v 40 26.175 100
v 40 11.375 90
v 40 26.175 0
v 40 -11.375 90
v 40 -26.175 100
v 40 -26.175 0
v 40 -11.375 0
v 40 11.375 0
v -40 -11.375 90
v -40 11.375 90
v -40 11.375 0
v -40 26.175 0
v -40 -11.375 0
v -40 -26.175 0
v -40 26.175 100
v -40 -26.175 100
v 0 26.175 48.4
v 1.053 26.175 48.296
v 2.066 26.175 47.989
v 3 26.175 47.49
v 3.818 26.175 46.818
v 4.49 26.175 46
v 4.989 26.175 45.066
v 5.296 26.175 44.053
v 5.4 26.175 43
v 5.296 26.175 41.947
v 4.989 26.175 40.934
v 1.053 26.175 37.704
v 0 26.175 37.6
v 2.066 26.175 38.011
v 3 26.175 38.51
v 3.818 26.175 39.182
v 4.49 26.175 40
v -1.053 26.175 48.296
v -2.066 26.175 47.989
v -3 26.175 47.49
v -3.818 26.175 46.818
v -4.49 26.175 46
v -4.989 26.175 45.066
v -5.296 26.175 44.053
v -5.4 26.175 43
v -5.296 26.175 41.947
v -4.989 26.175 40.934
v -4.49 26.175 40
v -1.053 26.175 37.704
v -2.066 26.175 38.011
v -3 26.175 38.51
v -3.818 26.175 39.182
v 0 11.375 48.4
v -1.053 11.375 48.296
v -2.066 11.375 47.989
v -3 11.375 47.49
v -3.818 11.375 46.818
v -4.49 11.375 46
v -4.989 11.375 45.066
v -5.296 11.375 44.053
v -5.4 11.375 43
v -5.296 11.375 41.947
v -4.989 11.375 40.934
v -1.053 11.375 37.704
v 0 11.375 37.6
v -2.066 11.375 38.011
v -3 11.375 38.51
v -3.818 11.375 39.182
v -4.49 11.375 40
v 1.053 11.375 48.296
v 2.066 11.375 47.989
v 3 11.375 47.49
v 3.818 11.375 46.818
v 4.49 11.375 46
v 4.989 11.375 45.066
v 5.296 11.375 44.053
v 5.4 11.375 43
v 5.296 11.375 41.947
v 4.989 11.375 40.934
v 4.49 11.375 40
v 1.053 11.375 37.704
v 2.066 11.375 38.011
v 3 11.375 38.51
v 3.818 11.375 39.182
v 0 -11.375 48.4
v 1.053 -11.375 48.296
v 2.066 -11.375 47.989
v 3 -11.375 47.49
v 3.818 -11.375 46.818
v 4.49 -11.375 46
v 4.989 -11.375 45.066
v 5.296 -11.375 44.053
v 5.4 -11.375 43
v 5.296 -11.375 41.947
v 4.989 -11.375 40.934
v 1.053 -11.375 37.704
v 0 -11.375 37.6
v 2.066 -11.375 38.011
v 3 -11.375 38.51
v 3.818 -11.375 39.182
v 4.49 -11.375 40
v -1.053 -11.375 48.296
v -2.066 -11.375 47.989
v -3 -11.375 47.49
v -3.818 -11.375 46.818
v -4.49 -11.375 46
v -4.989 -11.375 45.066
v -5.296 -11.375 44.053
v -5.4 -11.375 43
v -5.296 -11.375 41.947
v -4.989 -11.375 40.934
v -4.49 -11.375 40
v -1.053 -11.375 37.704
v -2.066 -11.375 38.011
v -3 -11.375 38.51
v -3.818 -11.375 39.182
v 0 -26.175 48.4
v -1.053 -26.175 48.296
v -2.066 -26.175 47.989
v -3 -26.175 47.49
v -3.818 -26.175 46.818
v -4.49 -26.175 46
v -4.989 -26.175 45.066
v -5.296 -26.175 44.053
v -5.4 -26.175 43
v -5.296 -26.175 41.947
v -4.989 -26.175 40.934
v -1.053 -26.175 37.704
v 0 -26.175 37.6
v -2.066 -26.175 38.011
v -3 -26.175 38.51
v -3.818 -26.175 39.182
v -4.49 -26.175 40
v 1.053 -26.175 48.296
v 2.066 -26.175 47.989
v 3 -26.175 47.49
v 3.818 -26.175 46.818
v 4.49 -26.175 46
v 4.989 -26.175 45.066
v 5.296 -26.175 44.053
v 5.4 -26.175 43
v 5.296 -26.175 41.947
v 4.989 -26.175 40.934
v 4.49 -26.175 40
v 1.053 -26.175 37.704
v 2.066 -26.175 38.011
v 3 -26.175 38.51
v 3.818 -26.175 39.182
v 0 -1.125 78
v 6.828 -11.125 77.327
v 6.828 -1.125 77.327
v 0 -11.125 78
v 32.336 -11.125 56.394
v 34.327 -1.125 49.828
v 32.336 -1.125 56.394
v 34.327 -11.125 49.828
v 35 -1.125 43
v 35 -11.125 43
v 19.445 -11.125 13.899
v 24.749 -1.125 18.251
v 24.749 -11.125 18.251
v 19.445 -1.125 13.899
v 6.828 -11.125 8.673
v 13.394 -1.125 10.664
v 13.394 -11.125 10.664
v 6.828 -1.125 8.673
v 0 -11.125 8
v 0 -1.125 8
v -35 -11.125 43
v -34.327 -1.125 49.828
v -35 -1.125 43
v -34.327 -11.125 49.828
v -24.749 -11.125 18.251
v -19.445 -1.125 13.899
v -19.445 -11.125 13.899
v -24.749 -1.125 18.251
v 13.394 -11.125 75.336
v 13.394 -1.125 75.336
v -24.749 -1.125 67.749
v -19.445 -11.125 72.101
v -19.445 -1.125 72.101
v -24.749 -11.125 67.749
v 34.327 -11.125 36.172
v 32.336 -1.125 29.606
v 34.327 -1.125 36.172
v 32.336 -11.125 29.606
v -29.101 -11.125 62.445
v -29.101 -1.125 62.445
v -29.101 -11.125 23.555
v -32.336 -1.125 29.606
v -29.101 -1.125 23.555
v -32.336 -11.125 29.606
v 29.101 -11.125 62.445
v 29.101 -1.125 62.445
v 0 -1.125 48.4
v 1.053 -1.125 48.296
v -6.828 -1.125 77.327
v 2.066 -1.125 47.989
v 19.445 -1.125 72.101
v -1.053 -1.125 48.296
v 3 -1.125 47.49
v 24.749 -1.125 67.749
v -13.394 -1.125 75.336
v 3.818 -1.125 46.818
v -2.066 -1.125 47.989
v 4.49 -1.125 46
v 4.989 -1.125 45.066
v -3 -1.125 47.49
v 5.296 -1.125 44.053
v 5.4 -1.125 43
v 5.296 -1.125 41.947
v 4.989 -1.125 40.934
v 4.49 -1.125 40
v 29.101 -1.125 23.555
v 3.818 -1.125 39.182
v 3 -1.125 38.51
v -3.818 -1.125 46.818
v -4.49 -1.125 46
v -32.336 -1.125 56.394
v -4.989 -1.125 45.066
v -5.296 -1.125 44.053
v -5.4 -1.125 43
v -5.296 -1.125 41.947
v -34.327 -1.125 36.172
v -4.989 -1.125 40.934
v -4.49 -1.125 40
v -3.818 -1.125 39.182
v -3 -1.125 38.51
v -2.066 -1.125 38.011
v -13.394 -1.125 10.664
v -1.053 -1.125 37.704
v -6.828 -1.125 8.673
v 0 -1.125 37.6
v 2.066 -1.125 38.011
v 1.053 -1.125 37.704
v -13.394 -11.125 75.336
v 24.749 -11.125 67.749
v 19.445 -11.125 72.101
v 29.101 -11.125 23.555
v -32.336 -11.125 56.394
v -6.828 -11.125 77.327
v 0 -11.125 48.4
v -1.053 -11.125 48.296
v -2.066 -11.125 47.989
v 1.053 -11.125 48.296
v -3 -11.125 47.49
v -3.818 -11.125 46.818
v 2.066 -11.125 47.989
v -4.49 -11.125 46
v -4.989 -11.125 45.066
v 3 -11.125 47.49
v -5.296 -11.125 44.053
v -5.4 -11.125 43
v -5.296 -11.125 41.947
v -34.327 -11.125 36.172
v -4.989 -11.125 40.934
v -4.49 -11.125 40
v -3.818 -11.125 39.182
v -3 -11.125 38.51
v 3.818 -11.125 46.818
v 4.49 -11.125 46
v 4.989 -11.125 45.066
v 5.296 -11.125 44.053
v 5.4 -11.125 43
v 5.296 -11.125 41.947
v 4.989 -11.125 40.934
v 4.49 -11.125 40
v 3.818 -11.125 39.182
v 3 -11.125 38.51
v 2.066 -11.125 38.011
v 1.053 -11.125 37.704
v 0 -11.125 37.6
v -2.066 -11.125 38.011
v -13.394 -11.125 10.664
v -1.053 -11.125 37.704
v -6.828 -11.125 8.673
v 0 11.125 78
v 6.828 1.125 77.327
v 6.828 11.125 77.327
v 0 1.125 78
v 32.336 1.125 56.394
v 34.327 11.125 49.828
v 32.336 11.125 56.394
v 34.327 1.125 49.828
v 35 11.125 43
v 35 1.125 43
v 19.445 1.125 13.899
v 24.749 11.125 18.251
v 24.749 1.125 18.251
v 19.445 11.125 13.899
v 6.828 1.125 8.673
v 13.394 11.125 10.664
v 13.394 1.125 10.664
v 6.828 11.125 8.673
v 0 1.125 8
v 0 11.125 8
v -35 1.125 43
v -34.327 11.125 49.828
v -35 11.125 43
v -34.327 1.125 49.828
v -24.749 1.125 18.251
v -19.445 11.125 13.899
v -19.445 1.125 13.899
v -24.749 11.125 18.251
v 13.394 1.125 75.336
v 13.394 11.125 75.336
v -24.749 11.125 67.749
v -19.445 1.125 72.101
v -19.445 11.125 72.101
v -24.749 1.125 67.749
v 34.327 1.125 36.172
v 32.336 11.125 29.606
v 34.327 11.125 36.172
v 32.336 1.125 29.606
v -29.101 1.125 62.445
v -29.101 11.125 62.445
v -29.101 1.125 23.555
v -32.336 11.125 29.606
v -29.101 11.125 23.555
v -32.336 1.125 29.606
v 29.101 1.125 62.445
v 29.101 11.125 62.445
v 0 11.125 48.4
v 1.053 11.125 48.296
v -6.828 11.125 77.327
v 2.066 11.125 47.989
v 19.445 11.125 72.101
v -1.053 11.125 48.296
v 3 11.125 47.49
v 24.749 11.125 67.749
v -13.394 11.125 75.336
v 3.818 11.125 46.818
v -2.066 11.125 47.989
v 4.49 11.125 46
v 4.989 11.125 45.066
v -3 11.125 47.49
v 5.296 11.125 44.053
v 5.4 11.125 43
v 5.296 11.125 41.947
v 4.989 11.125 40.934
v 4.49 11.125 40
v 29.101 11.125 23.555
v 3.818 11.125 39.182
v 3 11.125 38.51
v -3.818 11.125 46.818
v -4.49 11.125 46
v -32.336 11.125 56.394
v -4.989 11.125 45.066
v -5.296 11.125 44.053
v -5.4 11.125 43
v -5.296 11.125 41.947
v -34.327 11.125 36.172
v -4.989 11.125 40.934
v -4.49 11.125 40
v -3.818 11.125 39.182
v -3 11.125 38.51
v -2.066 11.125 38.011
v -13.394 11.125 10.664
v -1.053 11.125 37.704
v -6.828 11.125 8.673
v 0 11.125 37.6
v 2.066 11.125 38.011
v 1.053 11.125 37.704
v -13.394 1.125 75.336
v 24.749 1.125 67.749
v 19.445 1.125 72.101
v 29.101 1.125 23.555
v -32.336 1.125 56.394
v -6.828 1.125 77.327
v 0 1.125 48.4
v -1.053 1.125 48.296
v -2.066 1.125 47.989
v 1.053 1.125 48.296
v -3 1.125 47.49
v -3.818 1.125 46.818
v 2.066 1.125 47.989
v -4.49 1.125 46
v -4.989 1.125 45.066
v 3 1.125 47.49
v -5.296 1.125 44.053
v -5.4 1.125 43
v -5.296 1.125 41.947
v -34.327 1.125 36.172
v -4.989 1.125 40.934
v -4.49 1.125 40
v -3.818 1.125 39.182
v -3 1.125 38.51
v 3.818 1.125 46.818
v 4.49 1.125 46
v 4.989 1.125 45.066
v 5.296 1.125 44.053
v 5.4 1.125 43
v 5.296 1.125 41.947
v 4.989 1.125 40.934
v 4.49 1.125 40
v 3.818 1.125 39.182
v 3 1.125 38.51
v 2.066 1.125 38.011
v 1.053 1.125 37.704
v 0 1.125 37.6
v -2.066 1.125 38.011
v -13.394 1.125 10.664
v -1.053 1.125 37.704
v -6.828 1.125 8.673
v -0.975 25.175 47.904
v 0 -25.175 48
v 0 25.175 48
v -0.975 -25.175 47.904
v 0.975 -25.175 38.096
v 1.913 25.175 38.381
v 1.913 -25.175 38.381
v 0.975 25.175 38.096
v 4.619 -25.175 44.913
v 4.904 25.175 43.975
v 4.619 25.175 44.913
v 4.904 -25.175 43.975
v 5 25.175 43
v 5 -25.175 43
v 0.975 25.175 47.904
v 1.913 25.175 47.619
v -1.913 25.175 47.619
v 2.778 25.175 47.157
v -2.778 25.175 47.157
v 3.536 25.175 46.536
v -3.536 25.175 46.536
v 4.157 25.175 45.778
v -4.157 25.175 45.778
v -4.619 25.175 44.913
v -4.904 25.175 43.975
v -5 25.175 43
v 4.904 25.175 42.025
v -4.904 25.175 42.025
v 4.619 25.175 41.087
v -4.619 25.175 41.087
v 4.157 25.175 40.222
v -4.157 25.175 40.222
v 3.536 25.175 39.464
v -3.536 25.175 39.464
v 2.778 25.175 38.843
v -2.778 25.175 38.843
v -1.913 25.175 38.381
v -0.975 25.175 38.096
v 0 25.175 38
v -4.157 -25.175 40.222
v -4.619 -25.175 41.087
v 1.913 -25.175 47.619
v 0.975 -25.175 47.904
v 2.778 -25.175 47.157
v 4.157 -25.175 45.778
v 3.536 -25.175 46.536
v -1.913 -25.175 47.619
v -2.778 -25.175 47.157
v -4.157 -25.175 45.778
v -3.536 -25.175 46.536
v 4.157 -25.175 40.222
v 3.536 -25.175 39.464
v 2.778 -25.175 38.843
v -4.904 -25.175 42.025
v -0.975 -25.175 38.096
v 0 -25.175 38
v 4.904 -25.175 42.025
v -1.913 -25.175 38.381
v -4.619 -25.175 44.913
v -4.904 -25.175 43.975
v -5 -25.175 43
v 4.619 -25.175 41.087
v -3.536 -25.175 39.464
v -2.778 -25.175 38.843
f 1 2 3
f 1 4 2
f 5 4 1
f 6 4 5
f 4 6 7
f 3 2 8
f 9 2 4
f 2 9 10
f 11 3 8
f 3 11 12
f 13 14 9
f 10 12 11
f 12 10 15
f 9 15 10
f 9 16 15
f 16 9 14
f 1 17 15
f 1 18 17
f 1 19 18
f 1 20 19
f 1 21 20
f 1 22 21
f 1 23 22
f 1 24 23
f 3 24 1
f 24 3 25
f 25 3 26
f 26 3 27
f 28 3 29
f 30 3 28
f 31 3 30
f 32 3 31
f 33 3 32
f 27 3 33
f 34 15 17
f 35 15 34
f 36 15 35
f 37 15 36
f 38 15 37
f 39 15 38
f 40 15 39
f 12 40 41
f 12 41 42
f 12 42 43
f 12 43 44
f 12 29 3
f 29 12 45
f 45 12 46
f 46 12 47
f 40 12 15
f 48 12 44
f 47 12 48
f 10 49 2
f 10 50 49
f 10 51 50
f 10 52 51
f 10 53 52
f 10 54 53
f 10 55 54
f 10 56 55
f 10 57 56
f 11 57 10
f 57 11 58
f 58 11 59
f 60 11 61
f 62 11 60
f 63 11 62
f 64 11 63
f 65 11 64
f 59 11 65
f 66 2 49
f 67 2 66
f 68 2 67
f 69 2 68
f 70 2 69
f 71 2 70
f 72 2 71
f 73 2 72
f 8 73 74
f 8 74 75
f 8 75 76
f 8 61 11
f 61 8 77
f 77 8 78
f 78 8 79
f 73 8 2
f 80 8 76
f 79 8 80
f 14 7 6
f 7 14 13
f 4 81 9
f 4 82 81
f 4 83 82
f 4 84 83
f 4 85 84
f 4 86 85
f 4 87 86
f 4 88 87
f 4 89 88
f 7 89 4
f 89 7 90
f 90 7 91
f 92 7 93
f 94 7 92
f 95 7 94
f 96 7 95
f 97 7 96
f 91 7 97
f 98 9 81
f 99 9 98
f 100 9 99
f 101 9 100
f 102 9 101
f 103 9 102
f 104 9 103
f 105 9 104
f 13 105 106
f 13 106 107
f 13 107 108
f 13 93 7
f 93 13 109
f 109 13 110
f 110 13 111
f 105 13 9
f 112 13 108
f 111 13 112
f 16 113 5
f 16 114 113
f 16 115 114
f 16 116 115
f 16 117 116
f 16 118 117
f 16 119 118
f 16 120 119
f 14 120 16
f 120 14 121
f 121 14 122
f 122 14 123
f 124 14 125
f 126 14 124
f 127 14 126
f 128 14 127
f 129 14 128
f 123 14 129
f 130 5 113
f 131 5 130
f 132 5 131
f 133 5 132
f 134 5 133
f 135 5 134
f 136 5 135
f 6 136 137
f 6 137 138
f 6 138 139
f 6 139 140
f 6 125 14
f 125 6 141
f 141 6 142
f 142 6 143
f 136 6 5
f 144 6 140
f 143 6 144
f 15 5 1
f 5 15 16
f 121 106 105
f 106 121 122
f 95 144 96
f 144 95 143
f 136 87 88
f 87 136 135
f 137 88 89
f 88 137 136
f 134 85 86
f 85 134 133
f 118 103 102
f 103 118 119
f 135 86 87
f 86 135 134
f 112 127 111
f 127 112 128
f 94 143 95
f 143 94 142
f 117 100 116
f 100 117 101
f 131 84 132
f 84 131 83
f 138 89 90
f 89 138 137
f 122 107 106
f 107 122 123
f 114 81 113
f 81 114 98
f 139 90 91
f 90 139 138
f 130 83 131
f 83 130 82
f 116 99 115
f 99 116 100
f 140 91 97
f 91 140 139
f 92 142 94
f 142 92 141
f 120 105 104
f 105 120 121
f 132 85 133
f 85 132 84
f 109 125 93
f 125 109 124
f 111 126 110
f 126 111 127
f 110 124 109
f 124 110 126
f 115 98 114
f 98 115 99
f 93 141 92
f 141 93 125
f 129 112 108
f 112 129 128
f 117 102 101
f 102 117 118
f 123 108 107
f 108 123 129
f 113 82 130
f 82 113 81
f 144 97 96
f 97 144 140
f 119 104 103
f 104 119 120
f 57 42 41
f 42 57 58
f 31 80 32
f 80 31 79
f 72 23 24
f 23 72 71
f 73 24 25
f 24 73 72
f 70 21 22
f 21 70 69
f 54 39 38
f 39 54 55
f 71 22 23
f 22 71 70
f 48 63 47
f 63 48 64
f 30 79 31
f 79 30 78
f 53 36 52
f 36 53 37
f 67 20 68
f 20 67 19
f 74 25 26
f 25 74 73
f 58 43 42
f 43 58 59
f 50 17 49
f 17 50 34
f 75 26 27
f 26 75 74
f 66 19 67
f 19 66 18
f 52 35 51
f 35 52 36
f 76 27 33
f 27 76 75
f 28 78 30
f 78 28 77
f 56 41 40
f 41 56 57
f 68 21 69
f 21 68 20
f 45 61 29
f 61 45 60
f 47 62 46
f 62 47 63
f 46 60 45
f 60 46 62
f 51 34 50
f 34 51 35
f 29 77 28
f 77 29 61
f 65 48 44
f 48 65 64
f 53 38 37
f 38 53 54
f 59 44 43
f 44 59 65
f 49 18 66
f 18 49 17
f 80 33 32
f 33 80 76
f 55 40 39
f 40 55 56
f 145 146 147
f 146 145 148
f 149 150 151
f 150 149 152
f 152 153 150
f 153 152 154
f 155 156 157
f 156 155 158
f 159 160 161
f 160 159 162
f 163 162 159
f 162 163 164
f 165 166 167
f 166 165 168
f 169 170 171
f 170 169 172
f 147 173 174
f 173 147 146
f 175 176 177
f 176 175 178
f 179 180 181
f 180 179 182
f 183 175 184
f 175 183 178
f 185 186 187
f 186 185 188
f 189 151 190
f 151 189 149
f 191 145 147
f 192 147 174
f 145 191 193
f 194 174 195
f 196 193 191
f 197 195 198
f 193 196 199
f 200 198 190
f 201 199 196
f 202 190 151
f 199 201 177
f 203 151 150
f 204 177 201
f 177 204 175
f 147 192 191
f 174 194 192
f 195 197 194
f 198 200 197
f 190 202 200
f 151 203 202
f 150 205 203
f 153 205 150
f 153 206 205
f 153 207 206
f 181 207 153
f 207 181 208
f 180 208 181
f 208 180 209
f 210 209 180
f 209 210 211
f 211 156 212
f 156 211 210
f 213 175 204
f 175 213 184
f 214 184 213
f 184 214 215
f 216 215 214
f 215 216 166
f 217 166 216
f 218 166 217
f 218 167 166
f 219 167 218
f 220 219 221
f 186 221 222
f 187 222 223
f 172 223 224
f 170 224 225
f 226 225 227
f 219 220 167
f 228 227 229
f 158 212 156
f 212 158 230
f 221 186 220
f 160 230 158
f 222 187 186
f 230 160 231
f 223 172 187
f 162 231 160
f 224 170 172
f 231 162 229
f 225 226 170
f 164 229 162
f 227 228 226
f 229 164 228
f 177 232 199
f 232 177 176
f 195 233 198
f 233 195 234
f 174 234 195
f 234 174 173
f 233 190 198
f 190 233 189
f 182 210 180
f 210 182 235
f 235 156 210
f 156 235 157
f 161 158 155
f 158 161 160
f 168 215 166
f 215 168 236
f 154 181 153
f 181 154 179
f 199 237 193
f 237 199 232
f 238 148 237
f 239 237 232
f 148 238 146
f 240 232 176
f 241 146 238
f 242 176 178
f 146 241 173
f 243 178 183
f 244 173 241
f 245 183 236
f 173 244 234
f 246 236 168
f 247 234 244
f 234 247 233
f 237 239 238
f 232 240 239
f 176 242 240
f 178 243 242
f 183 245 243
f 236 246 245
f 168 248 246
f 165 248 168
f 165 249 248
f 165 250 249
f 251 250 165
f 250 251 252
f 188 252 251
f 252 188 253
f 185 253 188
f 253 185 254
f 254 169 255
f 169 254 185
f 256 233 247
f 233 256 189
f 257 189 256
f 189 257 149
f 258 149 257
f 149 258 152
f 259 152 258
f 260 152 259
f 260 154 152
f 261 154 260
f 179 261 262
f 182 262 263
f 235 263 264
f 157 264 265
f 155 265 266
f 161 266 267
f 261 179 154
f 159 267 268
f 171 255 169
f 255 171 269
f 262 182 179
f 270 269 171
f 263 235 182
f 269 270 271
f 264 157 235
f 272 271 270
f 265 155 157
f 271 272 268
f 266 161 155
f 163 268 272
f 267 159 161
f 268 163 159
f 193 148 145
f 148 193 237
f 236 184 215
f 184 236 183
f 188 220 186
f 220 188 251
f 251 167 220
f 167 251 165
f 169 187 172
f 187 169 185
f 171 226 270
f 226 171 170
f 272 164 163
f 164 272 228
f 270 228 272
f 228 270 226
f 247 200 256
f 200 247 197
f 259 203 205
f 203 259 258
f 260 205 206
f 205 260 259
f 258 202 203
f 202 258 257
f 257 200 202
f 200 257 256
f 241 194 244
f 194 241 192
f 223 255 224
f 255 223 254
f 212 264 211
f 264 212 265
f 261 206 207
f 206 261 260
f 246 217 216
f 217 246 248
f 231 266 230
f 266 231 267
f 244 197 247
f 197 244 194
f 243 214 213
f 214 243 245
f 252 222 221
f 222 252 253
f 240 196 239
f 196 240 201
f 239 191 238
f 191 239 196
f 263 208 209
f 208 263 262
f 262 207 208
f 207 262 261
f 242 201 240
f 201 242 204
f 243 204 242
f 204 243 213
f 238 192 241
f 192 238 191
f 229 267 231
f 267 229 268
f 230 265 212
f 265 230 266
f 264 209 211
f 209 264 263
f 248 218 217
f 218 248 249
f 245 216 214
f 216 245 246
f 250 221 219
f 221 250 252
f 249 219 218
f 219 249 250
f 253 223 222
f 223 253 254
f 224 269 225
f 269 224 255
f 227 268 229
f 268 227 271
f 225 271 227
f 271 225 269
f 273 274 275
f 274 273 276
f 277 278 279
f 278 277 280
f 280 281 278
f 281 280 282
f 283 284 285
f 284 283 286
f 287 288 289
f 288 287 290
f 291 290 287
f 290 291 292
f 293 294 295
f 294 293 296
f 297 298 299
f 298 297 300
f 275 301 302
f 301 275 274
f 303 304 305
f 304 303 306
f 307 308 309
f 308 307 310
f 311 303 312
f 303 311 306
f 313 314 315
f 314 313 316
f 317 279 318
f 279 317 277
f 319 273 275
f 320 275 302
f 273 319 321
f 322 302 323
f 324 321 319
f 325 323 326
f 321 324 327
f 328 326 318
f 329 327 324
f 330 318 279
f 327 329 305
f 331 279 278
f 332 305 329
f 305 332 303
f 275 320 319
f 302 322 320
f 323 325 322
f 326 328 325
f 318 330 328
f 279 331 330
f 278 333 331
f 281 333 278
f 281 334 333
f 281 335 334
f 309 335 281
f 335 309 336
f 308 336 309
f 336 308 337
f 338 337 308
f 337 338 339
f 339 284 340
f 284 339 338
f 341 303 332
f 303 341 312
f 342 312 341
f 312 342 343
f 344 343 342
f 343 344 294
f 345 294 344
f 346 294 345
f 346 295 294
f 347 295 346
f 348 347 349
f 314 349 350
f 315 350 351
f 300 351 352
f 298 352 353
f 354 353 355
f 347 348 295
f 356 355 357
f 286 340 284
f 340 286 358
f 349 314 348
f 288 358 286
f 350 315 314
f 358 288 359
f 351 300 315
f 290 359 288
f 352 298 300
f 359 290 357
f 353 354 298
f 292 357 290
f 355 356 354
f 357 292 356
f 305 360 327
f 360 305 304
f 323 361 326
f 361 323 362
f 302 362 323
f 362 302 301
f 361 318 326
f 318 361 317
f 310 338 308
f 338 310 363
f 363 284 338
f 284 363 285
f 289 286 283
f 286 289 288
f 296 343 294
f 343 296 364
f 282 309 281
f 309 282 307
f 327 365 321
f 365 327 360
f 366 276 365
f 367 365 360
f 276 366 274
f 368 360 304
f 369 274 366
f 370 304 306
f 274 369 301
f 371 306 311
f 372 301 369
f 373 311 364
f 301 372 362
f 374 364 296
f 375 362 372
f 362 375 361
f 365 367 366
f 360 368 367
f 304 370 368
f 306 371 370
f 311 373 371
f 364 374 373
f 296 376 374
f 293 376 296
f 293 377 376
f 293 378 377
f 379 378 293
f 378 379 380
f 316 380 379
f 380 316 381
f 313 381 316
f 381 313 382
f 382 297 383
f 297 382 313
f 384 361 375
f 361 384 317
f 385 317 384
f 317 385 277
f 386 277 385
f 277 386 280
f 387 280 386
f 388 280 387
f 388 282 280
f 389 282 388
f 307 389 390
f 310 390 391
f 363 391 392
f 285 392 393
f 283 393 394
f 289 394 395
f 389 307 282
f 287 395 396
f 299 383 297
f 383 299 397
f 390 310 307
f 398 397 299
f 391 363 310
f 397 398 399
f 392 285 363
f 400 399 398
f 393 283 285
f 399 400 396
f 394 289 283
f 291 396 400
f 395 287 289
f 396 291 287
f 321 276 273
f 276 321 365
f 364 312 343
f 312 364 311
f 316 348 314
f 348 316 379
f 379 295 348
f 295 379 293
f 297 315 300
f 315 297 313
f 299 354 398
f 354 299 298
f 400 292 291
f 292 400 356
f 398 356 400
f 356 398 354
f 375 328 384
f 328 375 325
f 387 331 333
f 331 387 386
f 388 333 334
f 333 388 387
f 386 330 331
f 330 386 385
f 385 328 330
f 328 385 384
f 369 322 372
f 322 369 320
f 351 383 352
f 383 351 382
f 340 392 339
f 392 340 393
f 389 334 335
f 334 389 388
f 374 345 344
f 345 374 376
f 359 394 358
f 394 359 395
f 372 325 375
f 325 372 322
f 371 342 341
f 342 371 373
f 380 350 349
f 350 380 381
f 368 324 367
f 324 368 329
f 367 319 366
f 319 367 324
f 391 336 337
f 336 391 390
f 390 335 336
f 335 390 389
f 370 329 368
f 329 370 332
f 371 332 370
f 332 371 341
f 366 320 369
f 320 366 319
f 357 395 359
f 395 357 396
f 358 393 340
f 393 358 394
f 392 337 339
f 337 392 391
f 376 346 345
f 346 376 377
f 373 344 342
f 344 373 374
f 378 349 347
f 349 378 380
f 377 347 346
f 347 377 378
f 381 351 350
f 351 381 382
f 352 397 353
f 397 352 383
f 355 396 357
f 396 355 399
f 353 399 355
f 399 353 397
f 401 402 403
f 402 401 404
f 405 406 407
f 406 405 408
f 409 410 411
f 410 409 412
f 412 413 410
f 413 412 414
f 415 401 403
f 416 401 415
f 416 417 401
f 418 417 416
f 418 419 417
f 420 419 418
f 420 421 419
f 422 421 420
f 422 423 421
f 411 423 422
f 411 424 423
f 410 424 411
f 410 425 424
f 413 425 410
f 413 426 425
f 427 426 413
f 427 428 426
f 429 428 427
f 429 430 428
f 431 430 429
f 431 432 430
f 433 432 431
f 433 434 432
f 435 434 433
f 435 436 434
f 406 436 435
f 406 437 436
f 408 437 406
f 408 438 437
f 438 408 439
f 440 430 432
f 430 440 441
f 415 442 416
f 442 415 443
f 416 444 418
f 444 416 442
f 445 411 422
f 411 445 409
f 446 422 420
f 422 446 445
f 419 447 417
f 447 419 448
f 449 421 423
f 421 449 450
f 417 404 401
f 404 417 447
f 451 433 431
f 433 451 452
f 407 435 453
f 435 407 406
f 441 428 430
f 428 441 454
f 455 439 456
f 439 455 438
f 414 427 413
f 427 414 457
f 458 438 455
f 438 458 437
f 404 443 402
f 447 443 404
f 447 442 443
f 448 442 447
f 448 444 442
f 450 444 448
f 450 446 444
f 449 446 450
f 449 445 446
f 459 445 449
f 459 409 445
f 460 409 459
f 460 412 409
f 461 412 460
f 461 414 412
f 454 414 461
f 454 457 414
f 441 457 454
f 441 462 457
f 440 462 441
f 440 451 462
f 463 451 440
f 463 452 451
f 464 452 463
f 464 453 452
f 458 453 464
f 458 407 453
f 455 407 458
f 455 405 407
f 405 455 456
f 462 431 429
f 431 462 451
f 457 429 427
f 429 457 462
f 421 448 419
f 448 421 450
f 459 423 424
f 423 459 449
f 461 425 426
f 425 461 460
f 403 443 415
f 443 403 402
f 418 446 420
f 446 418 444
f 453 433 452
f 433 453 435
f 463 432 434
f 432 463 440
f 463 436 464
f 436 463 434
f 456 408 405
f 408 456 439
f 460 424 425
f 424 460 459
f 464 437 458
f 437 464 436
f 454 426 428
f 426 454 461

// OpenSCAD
$fn = 32;

// ------------------------------------------------------------------------
// Trolley wheel set: wheels d70, fork 90 mm tall
// Every part is its own module, assembly() places every instance.
// ------------------------------------------------------------------------

// --- part 1 ---
module trolley_fork() {
  difference() {
    union() {
      translate([-40, 11.375, 0]) cube([80, 14.8, 90]);
      translate([-40, -26.175, 0]) cube([80, 14.8, 90]);
      translate([-40, -26.175, 90]) cube([80, 52.35, 10]);
    }
    translate([0, -18.775, 43]) rotate([90, 0, 0]) cylinder(h = 16.8, d = 10.8, center = true);
    translate([0, 18.775, 43]) rotate([90, 0, 0]) cylinder(h = 16.8, d = 10.8, center = true);
  }
}

// --- part 2 ---
module trolley_wheel() {
  difference() {
      translate([0, 0, 0]) cylinder(h = 10, d = 70);
      translate([0, 0, -1]) cylinder(h = 12, d = 10.8);
    }
}

// --- part 3 ---
module trolley_axle() {
  translate([0, 0, -25.175]) cylinder(h = 50.35, d = 10);
}

// --- assembly ---
module assembly() {
  color([0.80, 0.24, 0.20]) translate([0, 0, 0]) rotate([0, 0, 0]) trolley_fork();
  color([0.20, 0.45, 0.75]) translate([0, -1.125, 43]) rotate([90, 0, 0]) trolley_wheel();
  color([0.25, 0.62, 0.32]) translate([0, 11.125, 43]) rotate([90, 0, 0]) trolley_wheel();
  color([0.92, 0.70, 0.18]) translate([0, 0, 43]) rotate([90, 0, 0]) trolley_axle();
}

assembly();
